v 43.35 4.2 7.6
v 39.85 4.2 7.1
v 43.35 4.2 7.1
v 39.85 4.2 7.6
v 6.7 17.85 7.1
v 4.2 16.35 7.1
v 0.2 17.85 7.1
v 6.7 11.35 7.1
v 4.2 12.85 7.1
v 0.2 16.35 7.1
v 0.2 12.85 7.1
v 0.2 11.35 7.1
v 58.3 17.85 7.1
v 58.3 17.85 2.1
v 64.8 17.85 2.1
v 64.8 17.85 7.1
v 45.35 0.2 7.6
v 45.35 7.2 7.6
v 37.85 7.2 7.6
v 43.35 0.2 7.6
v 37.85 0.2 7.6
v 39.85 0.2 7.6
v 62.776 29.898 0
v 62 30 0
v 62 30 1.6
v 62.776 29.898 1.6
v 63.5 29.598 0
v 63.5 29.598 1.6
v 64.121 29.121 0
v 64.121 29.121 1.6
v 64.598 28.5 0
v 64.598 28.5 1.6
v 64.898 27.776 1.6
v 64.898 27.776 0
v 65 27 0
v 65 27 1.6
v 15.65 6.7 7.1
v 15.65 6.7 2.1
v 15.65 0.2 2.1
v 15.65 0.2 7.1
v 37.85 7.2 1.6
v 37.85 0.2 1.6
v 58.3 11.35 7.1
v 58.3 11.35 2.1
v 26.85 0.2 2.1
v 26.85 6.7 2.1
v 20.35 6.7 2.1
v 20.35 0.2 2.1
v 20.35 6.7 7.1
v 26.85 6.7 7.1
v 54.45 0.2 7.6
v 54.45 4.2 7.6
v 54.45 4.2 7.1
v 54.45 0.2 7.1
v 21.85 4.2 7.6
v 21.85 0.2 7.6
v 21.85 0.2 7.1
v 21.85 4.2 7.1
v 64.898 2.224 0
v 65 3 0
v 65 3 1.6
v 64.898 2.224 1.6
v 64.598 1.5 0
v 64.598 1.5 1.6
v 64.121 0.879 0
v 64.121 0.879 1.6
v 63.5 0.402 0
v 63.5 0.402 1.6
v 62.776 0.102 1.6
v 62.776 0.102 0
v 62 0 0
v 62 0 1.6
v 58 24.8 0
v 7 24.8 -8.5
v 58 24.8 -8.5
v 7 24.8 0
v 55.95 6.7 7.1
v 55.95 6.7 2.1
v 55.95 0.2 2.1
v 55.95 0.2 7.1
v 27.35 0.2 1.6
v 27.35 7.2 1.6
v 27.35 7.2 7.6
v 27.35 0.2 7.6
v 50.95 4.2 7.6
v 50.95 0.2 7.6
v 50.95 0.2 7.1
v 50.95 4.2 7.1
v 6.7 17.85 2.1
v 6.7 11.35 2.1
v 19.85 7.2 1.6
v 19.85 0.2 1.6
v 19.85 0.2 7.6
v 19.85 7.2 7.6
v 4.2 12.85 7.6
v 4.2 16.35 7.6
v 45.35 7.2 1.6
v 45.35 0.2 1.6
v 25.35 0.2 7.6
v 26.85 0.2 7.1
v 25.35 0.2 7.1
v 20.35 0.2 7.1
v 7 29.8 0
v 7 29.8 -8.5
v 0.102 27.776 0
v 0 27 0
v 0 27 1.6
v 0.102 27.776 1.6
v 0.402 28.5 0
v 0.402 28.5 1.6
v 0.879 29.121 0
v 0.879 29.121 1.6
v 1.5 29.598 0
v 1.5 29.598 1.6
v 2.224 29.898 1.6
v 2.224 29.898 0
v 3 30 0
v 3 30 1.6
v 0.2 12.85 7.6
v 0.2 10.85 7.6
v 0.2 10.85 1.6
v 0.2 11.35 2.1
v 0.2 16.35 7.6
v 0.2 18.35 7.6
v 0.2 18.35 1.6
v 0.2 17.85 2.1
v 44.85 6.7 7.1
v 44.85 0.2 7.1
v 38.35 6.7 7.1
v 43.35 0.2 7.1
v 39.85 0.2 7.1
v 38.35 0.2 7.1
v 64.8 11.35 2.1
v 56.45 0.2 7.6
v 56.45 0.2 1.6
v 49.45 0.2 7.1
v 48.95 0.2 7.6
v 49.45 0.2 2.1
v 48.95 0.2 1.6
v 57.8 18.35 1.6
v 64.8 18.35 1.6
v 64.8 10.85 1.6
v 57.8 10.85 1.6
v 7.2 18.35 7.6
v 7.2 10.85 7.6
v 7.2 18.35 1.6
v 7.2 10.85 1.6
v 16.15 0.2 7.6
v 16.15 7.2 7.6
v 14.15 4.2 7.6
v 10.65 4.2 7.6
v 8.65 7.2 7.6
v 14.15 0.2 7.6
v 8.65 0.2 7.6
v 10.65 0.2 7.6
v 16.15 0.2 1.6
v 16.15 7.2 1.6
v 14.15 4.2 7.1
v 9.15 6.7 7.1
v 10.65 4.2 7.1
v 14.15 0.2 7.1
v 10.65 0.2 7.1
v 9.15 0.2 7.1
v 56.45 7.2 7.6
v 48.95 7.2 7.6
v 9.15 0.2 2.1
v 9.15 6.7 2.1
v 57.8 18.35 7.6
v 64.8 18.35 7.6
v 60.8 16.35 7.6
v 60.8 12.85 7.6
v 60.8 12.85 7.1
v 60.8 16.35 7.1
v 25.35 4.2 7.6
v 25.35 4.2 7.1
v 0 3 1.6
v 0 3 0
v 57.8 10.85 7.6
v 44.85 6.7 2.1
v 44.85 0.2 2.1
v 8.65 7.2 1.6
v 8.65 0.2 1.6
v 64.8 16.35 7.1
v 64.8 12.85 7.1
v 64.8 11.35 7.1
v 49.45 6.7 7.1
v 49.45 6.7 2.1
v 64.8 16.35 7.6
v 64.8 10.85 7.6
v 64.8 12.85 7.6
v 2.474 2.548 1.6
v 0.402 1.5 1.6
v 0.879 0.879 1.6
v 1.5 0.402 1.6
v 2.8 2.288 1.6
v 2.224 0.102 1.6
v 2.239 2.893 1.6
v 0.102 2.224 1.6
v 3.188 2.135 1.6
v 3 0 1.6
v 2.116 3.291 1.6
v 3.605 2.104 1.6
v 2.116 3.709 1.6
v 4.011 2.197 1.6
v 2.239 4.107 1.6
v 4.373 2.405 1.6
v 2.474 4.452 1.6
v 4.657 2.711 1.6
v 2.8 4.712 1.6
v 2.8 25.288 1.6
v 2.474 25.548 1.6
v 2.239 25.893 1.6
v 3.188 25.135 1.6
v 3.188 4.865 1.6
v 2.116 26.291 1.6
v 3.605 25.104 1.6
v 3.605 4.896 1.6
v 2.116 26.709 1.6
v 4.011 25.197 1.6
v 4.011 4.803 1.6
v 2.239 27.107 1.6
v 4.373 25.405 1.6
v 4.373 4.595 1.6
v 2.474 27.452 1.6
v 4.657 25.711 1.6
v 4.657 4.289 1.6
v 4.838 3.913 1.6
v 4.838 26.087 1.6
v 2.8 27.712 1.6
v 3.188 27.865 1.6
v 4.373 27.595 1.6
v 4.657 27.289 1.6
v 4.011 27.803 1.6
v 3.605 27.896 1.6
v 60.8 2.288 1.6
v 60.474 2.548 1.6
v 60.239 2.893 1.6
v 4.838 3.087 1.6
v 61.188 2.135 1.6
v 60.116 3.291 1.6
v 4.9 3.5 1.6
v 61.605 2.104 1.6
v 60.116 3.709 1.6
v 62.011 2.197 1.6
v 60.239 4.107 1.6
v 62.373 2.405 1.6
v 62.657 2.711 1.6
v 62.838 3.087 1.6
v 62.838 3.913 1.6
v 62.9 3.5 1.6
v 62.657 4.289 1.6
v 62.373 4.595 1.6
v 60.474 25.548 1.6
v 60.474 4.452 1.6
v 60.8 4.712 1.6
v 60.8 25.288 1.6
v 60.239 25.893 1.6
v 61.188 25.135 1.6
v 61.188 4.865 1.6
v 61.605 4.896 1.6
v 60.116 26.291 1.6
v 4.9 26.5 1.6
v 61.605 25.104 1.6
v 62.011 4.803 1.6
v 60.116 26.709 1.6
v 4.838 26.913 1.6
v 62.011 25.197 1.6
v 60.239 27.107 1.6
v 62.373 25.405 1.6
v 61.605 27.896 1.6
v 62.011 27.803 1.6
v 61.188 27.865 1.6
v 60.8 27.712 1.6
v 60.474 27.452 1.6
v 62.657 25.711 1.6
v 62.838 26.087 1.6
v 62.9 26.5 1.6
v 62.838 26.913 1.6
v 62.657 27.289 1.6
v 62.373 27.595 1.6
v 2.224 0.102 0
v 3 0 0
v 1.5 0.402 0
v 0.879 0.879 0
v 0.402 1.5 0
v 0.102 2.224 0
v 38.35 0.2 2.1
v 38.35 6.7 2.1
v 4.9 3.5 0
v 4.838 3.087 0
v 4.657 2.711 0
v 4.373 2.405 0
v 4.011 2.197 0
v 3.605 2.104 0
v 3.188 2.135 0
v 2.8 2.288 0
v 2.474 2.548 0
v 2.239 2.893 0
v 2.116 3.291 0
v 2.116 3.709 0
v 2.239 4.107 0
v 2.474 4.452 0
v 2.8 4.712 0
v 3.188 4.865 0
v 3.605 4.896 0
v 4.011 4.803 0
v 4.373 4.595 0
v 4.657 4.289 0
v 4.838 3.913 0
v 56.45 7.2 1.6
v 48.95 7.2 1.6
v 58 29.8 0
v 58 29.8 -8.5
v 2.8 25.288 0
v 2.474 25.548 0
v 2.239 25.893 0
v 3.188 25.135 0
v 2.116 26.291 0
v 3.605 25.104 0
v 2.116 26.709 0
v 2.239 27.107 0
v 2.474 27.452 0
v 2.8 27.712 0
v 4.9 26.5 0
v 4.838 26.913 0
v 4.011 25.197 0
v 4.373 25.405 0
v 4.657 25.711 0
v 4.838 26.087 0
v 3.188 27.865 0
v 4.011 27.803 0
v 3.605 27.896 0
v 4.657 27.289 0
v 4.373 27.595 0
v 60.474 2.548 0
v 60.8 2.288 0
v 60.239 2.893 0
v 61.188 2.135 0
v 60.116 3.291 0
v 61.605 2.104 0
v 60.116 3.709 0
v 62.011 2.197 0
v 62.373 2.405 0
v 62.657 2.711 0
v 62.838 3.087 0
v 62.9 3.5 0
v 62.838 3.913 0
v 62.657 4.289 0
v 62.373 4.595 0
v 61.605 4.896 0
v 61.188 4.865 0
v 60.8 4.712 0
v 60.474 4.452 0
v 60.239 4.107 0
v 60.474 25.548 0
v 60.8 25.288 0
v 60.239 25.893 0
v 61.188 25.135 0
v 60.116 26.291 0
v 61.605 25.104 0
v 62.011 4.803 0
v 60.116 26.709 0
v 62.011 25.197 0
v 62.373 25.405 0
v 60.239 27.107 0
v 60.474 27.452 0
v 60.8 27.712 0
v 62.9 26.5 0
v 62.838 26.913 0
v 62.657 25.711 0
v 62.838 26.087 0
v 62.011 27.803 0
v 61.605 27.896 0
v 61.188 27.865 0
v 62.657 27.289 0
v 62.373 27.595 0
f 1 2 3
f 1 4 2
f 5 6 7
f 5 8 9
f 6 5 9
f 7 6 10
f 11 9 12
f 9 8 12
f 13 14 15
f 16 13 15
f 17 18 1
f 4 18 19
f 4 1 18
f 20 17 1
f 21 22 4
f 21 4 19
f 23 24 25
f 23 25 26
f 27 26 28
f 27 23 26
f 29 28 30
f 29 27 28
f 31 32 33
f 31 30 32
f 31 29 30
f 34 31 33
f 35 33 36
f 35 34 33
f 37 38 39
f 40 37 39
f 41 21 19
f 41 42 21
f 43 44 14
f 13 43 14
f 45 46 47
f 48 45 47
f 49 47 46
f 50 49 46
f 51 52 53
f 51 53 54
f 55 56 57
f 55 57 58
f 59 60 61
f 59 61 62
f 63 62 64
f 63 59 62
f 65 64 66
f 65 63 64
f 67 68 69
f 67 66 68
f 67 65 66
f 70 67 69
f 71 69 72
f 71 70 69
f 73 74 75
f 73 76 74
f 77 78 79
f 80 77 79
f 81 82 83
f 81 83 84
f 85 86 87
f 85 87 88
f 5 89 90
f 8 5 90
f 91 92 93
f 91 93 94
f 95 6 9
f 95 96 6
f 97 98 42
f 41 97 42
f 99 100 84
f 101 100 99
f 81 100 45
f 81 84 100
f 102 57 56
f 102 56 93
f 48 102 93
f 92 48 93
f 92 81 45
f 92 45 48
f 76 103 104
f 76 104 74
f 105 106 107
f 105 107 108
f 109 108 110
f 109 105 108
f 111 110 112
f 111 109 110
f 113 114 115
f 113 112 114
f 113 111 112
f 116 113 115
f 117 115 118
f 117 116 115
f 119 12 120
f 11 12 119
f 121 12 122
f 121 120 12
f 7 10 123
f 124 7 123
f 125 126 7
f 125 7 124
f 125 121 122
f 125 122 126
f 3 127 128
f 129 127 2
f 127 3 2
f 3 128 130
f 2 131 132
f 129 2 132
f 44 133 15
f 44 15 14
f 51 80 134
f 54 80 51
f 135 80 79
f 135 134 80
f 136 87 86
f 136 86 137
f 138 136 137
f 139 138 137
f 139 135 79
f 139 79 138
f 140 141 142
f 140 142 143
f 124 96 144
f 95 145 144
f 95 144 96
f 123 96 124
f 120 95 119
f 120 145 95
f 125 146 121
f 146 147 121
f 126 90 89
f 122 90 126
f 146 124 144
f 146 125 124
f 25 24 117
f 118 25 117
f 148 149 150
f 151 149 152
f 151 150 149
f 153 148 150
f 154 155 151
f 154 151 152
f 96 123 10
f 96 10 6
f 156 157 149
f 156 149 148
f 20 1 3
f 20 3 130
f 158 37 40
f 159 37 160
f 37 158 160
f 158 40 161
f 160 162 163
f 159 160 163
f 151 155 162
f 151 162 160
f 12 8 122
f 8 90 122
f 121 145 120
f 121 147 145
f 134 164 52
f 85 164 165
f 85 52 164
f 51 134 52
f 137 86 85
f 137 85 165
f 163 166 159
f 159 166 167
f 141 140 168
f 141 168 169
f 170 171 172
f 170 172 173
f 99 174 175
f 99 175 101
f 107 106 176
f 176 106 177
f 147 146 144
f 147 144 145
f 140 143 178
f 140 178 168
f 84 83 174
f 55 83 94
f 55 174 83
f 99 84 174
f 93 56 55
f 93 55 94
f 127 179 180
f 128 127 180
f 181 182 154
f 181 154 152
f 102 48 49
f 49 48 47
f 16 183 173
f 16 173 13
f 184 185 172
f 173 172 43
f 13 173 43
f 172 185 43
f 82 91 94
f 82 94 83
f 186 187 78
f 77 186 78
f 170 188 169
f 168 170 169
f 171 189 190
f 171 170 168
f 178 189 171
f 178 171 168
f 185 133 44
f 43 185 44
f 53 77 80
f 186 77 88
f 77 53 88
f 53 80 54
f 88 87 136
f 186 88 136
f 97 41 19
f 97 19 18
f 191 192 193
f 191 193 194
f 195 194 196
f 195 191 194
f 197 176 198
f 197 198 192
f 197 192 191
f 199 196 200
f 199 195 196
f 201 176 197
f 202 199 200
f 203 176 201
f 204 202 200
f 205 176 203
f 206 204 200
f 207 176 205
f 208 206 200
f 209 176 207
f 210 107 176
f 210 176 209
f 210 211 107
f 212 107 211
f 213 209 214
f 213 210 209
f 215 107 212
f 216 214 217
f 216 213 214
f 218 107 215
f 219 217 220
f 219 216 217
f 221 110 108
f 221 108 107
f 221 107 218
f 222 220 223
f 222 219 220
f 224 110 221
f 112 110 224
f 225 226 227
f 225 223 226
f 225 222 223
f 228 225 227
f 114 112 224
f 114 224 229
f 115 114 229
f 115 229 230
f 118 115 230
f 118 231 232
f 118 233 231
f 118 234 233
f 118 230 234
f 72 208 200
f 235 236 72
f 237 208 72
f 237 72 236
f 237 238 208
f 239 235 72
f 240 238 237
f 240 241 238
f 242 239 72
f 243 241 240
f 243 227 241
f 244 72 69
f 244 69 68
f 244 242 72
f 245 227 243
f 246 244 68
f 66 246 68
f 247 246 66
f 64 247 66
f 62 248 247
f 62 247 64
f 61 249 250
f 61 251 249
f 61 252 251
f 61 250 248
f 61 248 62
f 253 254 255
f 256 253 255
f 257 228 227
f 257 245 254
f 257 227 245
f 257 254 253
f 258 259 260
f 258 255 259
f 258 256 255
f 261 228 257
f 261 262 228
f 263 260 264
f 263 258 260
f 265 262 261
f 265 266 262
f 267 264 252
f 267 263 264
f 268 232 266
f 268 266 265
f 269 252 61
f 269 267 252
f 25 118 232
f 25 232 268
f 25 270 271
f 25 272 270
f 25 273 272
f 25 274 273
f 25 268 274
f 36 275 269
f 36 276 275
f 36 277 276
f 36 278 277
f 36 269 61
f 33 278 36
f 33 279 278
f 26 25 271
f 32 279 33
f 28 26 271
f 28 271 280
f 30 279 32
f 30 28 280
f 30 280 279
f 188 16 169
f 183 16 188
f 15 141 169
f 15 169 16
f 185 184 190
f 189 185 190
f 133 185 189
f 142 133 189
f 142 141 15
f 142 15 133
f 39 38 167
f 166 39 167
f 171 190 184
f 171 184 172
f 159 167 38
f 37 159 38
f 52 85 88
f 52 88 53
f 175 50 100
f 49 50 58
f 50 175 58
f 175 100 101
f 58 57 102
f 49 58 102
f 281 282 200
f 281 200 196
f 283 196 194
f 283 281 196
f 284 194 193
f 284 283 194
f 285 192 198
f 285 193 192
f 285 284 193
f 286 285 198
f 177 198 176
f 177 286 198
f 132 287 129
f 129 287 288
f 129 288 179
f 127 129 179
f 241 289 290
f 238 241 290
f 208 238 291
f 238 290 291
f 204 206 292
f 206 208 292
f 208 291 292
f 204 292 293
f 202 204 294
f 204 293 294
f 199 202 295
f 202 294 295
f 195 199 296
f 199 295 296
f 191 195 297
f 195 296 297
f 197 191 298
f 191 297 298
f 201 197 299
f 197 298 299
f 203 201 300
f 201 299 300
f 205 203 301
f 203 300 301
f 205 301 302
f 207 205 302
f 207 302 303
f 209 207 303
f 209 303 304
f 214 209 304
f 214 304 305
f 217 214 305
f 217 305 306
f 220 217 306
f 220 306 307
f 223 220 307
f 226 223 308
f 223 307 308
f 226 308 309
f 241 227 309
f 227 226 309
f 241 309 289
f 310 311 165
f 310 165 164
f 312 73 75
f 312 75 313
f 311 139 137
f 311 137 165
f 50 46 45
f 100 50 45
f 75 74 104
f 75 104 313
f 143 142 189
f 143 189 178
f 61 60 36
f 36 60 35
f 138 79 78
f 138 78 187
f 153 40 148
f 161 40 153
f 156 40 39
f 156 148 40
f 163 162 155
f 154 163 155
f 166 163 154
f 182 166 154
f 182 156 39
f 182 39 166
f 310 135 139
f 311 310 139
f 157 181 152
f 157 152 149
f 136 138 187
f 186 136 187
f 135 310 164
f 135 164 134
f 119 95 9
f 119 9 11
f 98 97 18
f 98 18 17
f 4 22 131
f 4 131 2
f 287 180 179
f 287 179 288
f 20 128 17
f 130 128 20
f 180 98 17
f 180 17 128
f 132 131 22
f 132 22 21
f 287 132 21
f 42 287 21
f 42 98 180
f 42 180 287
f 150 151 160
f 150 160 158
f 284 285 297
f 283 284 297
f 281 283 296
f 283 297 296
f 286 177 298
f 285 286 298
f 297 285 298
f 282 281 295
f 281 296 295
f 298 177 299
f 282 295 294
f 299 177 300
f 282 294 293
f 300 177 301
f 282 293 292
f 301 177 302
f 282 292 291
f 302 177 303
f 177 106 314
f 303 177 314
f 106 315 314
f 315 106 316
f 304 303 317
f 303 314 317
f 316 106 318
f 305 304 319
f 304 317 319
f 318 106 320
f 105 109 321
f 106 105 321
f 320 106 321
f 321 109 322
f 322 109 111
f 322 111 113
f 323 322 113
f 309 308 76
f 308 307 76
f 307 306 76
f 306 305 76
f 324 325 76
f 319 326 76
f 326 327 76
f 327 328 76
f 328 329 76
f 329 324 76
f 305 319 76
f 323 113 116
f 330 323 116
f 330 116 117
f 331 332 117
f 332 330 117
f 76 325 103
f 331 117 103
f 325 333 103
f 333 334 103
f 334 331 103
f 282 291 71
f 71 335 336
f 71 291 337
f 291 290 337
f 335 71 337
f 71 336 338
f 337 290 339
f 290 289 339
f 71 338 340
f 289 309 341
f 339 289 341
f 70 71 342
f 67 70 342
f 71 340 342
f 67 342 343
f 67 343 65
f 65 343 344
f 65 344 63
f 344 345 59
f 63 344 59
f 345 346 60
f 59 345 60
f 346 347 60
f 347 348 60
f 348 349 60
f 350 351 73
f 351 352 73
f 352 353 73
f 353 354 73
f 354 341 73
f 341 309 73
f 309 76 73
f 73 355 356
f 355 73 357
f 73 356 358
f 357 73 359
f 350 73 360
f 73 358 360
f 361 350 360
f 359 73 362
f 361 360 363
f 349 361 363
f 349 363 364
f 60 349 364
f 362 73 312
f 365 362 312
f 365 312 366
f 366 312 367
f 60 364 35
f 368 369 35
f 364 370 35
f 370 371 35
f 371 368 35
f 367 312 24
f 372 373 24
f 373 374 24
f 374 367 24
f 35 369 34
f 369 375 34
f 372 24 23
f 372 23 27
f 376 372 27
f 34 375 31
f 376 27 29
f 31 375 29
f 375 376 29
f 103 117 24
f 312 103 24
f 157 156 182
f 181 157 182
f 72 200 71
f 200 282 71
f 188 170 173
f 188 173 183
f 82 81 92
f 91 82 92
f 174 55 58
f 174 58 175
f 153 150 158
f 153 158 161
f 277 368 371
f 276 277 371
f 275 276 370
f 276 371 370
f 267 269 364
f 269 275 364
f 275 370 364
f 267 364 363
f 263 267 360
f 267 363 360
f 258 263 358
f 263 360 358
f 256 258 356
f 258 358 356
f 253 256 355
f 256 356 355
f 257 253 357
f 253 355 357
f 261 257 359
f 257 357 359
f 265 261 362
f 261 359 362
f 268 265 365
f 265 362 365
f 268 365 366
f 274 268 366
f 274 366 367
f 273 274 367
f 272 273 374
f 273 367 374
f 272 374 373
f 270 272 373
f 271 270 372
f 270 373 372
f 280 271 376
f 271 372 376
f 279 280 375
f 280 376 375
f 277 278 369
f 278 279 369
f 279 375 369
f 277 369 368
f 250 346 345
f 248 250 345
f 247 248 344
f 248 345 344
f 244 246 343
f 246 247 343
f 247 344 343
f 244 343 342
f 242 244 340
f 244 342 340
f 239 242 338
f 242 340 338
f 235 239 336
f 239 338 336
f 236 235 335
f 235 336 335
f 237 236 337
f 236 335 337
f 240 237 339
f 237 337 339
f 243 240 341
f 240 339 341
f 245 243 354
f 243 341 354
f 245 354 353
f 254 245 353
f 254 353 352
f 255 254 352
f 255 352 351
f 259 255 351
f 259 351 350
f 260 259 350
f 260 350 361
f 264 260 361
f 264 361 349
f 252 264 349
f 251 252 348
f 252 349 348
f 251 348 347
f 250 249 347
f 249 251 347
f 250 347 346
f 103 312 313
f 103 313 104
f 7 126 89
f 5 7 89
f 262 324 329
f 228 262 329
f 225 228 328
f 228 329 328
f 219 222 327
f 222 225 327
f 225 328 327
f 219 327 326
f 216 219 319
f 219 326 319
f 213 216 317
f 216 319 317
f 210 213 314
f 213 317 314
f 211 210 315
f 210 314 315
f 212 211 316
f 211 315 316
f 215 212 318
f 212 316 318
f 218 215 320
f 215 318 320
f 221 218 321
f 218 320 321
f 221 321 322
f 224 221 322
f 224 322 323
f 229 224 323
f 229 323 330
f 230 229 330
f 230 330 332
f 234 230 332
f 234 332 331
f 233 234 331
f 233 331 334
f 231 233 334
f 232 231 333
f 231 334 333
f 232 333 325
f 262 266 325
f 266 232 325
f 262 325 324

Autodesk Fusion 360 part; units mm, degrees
sketch "Adafruit Arcade Bonnet" plane through (0, 0, 0) normal (0, 0, 1) x (1, 0, 0)
  circle A0 centre (3.5, 26.5) radius 1.4
  arc A1 (65, 27) -> (62, 30) centre (62, 27) ccw
  line L0 (65, 3) -> (65, 27)
  line L1 (62, 30) -> (3, 30)
  line L2 (0, 27) -> (0, 3)
  arc A2 (0, 3) -> (3, 0) centre (3, 3) ccw
  arc A3 (3, 30) -> (0, 27) centre (3, 27) ccw
  line L3 (3, 0) -> (62, 0)
  circle A4 centre (61.5, 26.5) radius 1.4
  circle A5 centre (3.5, 3.5) radius 1.4
  arc A6 (62, 0) -> (65, 3) centre (62, 3) ccw
  circle A7 centre (61.5, 3.5) radius 1.4
extrude "Extrude1" add sketch "Adafruit Arcade Bonnet" along normal blind 1.6 makes body 1
sketch "jst boxes" plane through (0, 0, 1.6) normal (0, 0, 1) x (-1, 0, 0)
  circle A0 centre (-3.5, -3.5) radius 1.4
  circle A1 centre (-61.5, -26.5) radius 1.4
  circle A2 centre (-61.5, -3.5) radius 1.4
  circle A3 centre (-3.5, -26.5) radius 1.4
  arc A4 (-62, 0) -> (-65, -3) centre (-62, -3) ccw
  line L0 (-65, -3) -> (-65, -27)
  arc A5 (-65, -27) -> (-62, -30) centre (-62, -27) ccw
  line L1 (-62, -30) -> (-3, -30)
  arc A6 (-3, -30) -> (0, -27) centre (-3, -27) ccw
  line L2 (0, -27) -> (0, -3)
  arc A7 (0, -3) -> (-3, 0) centre (-3, -3) ccw
  line L3 (-3, 0) -> (-62, 0)
  line L4 (-7.2, -10.85) -> (-0.2, -10.85)
  line L5 (-0.2, -10.85) -> (-0.2, -18.35)
  line L6 (-0.2, -18.35) -> (-7.2, -18.35)
  line L7 (-7.2, -18.35) -> (-7.2, -10.85)
  line L8 (-7.2, -10.85) -> (-0.2, -18.35) construction
  line L9 (-0.2, -10.85) -> (-7.2, -18.35) construction
  line L10 (-16.15, -0.2) -> (-8.65, -0.2)
  line L11 (-8.65, -0.2) -> (-8.65, -7.2)
  line L12 (-8.65, -7.2) -> (-16.15, -7.2)
  line L13 (-16.15, -7.2) -> (-16.15, -0.2)
  line L14 (-16.15, -0.2) -> (-8.65, -7.2) construction
  line L15 (-8.65, -0.2) -> (-16.15, -7.2) construction
  line L16 (-27.35, -0.2) -> (-19.85, -0.2)
  line L17 (-19.85, -0.2) -> (-19.85, -7.2)
  line L18 (-19.85, -7.2) -> (-27.35, -7.2)
  line L19 (-27.35, -7.2) -> (-27.35, -0.2)
  line L20 (-27.35, -0.2) -> (-19.85, -7.2) construction
  line L21 (-19.85, -0.2) -> (-27.35, -7.2) construction
  line L22 (-56.45, -0.2) -> (-48.95, -0.2)
  line L23 (-48.95, -0.2) -> (-48.95, -7.2)
  line L24 (-48.95, -7.2) -> (-56.45, -7.2)
  line L25 (-56.45, -7.2) -> (-56.45, -0.2)
  line L26 (-56.45, -0.2) -> (-48.95, -7.2) construction
  line L27 (-48.95, -0.2) -> (-56.45, -7.2) construction
  line L28 (-45.35, -0.2) -> (-37.85, -0.2)
  line L29 (-37.85, -0.2) -> (-37.85, -7.2)
  line L30 (-37.85, -7.2) -> (-45.35, -7.2)
  line L31 (-45.35, -7.2) -> (-45.35, -0.2)
  line L32 (-45.35, -0.2) -> (-37.85, -7.2) construction
  line L33 (-37.85, -0.2) -> (-45.35, -7.2) construction
  line L34 (-64.8, -10.85) -> (-57.8, -10.85)
  line L35 (-57.8, -10.85) -> (-57.8, -18.35)
  line L36 (-57.8, -18.35) -> (-64.8, -18.35)
  line L37 (-64.8, -18.35) -> (-64.8, -10.85)
  line L38 (-64.8, -10.85) -> (-57.8, -18.35) construction
  line L39 (-57.8, -10.85) -> (-64.8, -18.35) construction
  point P0 (-3.7, -14.6)
  point P1 (-12.4, -3.7)
  point P2 (-23.6, -3.7)
  point P3 (-52.7, -3.7)
  point P4 (-41.6, -3.7)
  point P5 (-61.3, -14.6)
  dimension "d3" = 7.5
  dimension "d4" = 7
  dimension "d5" = 14.6
  dimension "d6" = 0.2
  dimension "d7" = 7.5
  dimension "d8" = 7
  dimension "d9" = 12.4
  dimension "d10" = 0.2
  dimension "d11" = 7.5
  dimension "d12" = 7
  dimension "d13" = 23.6
  dimension "d14" = 0.2
  dimension "d15" = 7.5
  dimension "d16" = 7
  dimension "d17" = 52.7
  dimension "d18" = 0.2
  dimension "d19" = 7.5
  dimension "d20" = 7
  dimension "d21" = 41.6
  dimension "d22" = 0.2
  dimension "d23" = 7.5
  dimension "d24" = 7
  dimension "d25" = 14.6
  dimension "d26" = 0.2
extrude "Extrude2" add sketch "jst boxes" along normal blind 6 separate body contours L4 L5 L6 L7 | L10 L11 L12 L13 | L16 L17 L18 L19 | L22 L23 L24 L25 | L28 L29 L30 L31 | L34 L35 L36 L37 makes body 2 at (40.35, 2.5333, 1.6) makes body 3 at (4.8667, 13.35, 1.6) makes body 4 at (53.95, 2.5333, 1.6) makes body 5 at (24.85, 2.5333, 1.6) makes body 6 at (13.65, 4.8667, 1.6) makes body 7 at (60.1333, 15.85, 1.6)
sketch "jst cuts" plane through (0, 0, 7.6) normal (0, 0, 1) x (-1, 0, 0)
  line L0 (-7.2, -18.35) -> (-0.2, -18.35)
  line L1 (-0.2, -18.35) -> (-0.2, -10.85)
  line L2 (-0.2, -10.85) -> (-7.2, -10.85)
  line L3 (-7.2, -10.85) -> (-7.2, -18.35)
  line L4 (-16.15, -7.2) -> (-8.65, -7.2)
  line L5 (-8.65, -7.2) -> (-8.65, -0.2)
  line L6 (-8.65, -0.2) -> (-16.15, -0.2)
  line L7 (-16.15, -0.2) -> (-16.15, -7.2)
  line L8 (-27.35, -7.2) -> (-19.85, -7.2)
  line L9 (-19.85, -7.2) -> (-19.85, -0.2)
  line L10 (-19.85, -0.2) -> (-27.35, -0.2)
  line L11 (-27.35, -0.2) -> (-27.35, -7.2)
  line L12 (-45.35, -7.2) -> (-37.85, -7.2)
  line L13 (-37.85, -7.2) -> (-37.85, -0.2)
  line L14 (-37.85, -0.2) -> (-45.35, -0.2)
  line L15 (-45.35, -0.2) -> (-45.35, -7.2)
  line L16 (-56.45, -7.2) -> (-48.95, -7.2)
  line L17 (-48.95, -7.2) -> (-48.95, -0.2)
  line L18 (-48.95, -0.2) -> (-56.45, -0.2)
  line L19 (-56.45, -0.2) -> (-56.45, -7.2)
  line L20 (-64.8, -18.35) -> (-57.8, -18.35)
  line L21 (-57.8, -18.35) -> (-57.8, -10.85)
  line L22 (-57.8, -10.85) -> (-64.8, -10.85)
  line L23 (-64.8, -10.85) -> (-64.8, -18.35)
  line L24 (-4.2, -12.85) -> (3.8, -12.85)
  line L25 (3.8, -12.85) -> (3.8, -16.35)
  line L26 (3.8, -16.35) -> (-4.2, -16.35)
  line L27 (-4.2, -16.35) -> (-4.2, -12.85)
  line L28 (-4.2, -12.85) -> (3.8, -16.35) construction
  line L29 (3.8, -12.85) -> (-4.2, -16.35) construction
  line L30 (-14.15, 3.8) -> (-10.65, 3.8)
  line L31 (-10.65, 3.8) -> (-10.65, -4.2)
  line L32 (-10.65, -4.2) -> (-14.15, -4.2)
  line L33 (-14.15, -4.2) -> (-14.15, 3.8)
  line L34 (-14.15, 3.8) -> (-10.65, -4.2) construction
  line L35 (-10.65, 3.8) -> (-14.15, -4.2) construction
  line L36 (-25.35, 3.8) -> (-21.85, 3.8)
  line L37 (-21.85, 3.8) -> (-21.85, -4.2)
  line L38 (-21.85, -4.2) -> (-25.35, -4.2)
  line L39 (-25.35, -4.2) -> (-25.35, 3.8)
  line L40 (-25.35, 3.8) -> (-21.85, -4.2) construction
  line L41 (-21.85, 3.8) -> (-25.35, -4.2) construction
  line L42 (-43.35, 3.8) -> (-39.85, 3.8)
  line L43 (-39.85, 3.8) -> (-39.85, -4.2)
  line L44 (-39.85, -4.2) -> (-43.35, -4.2)
  line L45 (-43.35, -4.2) -> (-43.35, 3.8)
  line L46 (-43.35, 3.8) -> (-39.85, -4.2) construction
  line L47 (-39.85, 3.8) -> (-43.35, -4.2) construction
  line L48 (-54.45, 3.8) -> (-50.95, 3.8)
  line L49 (-50.95, 3.8) -> (-50.95, -4.2)
  line L50 (-50.95, -4.2) -> (-54.45, -4.2)
  line L51 (-54.45, -4.2) -> (-54.45, 3.8)
  line L52 (-54.45, 3.8) -> (-50.95, -4.2) construction
  line L53 (-50.95, 3.8) -> (-54.45, -4.2) construction
  line L54 (-68.8, -12.85) -> (-60.8, -12.85)
  line L55 (-60.8, -12.85) -> (-60.8, -16.35)
  line L56 (-60.8, -16.35) -> (-68.8, -16.35)
  line L57 (-68.8, -16.35) -> (-68.8, -12.85)
  line L58 (-68.8, -12.85) -> (-60.8, -16.35) construction
  line L59 (-60.8, -12.85) -> (-68.8, -16.35) construction
  point P0 (-0.2, -14.6)
  point P1 (-12.4, -0.2)
  point P2 (-23.6, -0.2)
  point P3 (-41.6, -0.2)
  point P4 (-52.7, -0.2)
  point P5 (-64.8, -14.6)
  dimension "d31" = 8
  dimension "d32" = 3.5
  dimension "d33" = 3.5
  dimension "d34" = 8
  dimension "d35" = 8
  dimension "d36" = 3.5
  dimension "d37" = 8
  dimension "d38" = 3.5
  dimension "d39" = 8
  dimension "d40" = 3.5
  dimension "d41" = 8
  dimension "d42" = 3.5
shell "Shell1" thickness 0.5 removed faces 6 at (42.85, 0.2, 3.6) at (0.2, 13.35, 3.6) at (53.95, 0.2, 3.6) at (24.85, 0.2, 3.6) at (13.65, 0.2, 3.6) at (64.8, 15.85, 3.6) on bodies 2 3 4 5 6 7
extrude "Extrude3" cut sketch "jst cuts" against normal blind 0.5 contours L1 L24 L26 L27 | L6 L31 L32 L33 | L10 L37 L38 L39 | L14 L43 L44 L45 | L18 L49 L50 L51 | L23 L54 L55 L56 bodies 2 3 4 5 6 7
sketch "Sketch4" plane through (0, 0, 0) normal (0, 0, -1) x (1, 0, 0)
  circle A0 centre (3.5, -3.5) radius 1.4
  circle A1 centre (61.5, -26.5) radius 1.4
  circle A2 centre (61.5, -3.5) radius 1.4
  circle A3 centre (3.5, -26.5) radius 1.4
  arc A4 (65, -3) -> (62, 0) centre (62, -3) ccw
  line L0 (62, 0) -> (3, 0)
  arc A5 (3, 0) -> (0, -3) centre (3, -3) ccw
  line L1 (0, -3) -> (0, -27)
  arc A6 (0, -27) -> (3, -30) centre (3, -27) ccw
  line L2 (3, -30) -> (62, -30)
  arc A7 (62, -30) -> (65, -27) centre (62, -27) ccw
  line L3 (65, -27) -> (65, -3)
  line L4 (32.5, 0) -> (32.5, -30) construction
  line L5 (58, -29.8) -> (7, -29.8)
  line L6 (7, -29.8) -> (7, -24.8)
  line L7 (7, -24.8) -> (58, -24.8)
  line L8 (58, -24.8) -> (58, -29.8)
  line L9 (58, -29.8) -> (7, -24.8) construction
  line L10 (7, -29.8) -> (58, -24.8) construction
  point P0 (32.5, -27.3)
  dimension "d46" = 51
  dimension "d47" = 5
  dimension "d51" = 0.2
extrude "Extrude4" add sketch "Sketch4" along normal blind 8.5 contours L5 L6 L7 L8 bodies 1
equation "d3 = jstWidth"
equation "d4 = jstLeng"
equation "d7 = jstWidth"
equation "d8 = jstLeng"
equation "d11 = jstWidth"
equation "d12 = jstLeng"
equation "d15 = jstWidth"
equation "d16 = jstLeng"
equation "d19 = jstWidth"
equation "d20 = jstLeng"
equation "d23 = jstWidth"
equation "d24 = jstLeng"
equation "jstWidth = 7.5 mm"
equation "jstLeng = 7 mm"
